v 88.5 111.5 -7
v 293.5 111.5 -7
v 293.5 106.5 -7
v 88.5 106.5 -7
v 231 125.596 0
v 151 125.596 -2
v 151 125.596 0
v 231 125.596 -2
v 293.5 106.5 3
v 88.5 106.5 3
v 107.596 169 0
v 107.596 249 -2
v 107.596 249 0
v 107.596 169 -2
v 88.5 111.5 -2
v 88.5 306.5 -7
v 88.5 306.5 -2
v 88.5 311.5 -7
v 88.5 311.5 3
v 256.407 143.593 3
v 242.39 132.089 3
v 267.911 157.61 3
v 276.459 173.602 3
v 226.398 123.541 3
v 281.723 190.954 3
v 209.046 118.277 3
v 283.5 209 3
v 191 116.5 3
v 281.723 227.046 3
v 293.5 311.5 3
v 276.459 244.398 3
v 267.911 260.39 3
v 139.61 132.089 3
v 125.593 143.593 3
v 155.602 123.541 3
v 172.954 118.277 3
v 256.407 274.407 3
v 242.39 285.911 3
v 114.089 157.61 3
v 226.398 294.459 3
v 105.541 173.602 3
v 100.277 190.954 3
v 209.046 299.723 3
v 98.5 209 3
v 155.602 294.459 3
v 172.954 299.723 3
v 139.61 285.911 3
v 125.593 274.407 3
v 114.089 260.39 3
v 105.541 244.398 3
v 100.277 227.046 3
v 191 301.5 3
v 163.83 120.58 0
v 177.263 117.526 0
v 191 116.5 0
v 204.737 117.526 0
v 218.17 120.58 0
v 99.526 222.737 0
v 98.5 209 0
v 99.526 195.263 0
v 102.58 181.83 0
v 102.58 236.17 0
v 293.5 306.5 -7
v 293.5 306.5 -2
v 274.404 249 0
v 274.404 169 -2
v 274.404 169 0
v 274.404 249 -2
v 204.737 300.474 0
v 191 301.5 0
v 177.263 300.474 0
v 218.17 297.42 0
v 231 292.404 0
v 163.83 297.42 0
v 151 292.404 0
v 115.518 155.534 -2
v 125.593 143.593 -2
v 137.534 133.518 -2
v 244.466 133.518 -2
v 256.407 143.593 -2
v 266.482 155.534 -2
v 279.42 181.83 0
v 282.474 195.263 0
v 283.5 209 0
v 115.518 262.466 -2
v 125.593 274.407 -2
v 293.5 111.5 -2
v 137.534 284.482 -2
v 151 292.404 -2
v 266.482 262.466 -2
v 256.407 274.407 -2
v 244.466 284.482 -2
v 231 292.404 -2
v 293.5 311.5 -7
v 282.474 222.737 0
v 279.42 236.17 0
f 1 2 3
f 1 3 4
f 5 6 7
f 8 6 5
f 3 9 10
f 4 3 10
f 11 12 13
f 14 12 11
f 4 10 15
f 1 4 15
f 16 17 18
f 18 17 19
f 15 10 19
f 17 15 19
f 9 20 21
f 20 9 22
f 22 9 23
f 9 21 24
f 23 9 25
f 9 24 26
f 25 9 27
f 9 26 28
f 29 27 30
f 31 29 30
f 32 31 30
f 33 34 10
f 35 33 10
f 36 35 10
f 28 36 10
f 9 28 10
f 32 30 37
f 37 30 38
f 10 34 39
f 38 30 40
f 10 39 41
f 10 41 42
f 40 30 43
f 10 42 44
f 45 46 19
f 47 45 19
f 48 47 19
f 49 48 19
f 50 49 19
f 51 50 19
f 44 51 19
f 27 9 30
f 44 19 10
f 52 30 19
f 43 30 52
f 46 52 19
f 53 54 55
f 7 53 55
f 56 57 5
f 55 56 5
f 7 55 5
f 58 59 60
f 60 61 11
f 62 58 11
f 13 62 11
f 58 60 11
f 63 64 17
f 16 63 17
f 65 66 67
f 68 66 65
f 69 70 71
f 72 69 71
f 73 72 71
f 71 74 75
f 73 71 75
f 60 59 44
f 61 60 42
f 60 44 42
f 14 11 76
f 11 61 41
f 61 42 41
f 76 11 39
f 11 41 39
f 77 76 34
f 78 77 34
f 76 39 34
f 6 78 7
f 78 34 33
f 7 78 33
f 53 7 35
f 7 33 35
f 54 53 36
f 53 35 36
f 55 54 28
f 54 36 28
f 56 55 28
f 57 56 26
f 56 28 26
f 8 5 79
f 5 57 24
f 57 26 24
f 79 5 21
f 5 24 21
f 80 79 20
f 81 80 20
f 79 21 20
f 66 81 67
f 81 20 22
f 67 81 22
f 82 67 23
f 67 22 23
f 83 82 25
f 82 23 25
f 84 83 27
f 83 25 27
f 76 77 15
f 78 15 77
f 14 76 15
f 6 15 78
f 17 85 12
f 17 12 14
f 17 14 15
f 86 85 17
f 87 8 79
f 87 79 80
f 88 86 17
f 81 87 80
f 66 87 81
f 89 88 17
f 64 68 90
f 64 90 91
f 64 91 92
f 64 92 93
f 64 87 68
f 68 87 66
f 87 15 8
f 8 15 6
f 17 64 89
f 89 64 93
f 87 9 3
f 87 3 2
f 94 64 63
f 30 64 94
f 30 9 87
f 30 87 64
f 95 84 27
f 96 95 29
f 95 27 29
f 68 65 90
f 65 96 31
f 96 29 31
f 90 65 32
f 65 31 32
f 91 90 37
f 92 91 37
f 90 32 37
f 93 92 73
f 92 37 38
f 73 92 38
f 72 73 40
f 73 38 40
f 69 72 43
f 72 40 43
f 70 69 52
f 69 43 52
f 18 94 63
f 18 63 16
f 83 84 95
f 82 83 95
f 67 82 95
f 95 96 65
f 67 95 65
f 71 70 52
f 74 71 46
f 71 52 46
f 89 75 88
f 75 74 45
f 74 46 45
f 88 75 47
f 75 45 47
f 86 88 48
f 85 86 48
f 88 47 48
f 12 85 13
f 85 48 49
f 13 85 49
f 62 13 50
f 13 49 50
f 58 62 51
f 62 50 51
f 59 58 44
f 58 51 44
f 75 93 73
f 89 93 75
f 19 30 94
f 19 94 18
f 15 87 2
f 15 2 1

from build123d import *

# Parameters (mm, degrees)
SKETCH_7_W               = 400
SKETCH_7_H               = 400
EXTRUDE_1_DEPTH          = 3
SKETCH_8_W               = 380
SKETCH_8_H               = 2
EXTRUDE_2_DEPTH          = 140
SKETCH_9_W               = 2
SKETCH_9_H               = 382
EXTRUDE_3_DEPTH          = 140
PATTERN_LINEAR_1_COUNT   = 12
PATTERN_LINEAR_1_PITCH   = 30
PATTERN_LINEAR_3_COUNT   = 12
PATTERN_LINEAR_3_PITCH   = 30
SKETCH_11_W              = 400
SKETCH_11_H              = 400
CUT_EXTRUDE_1_DEPTH      = 3
CUT_EXTRUDE_2_DEPTH      = 570.034269618
CUT_EXTRUDE_2_DEPTH_BACK = 570.034269618
SKETCH_12_R              = 300
SKETCH_12_R_2            = 90
SKETCH_13_R              = 92.5
SKETCH_13_R_2            = 89.5
EXTRUDE_8_DEPTH          = 140
SKETCH_14_W              = 205
SKETCH_14_H              = 205
SKETCH_14_W_2            = 185
SKETCH_14_H_2            = 185
EXTRUDE_9_DEPTH          = 5
EXTRUDE_10_DEPTH         = 2
PATTERN_CIRCULAR_1_COUNT = 4
CUT_EXTRUDE_START        = -140
SKETCH_16_R              = 92.5
CUT_EXTRUDE_3_DEPTH      = 140
SKETCH_17_W              = 205
SKETCH_17_H              = 5
EXTRUDE_11_DEPTH         = 5


with BuildPart() as part:
    # 草图7 → 凸台-拉伸1 (new body)
    with BuildSketch(Plane.XY):
        with Locations((200, 200)):
            Rectangle(SKETCH_7_W, SKETCH_7_H)
    extrude(amount=EXTRUDE_1_DEPTH)

    # 草图8 → 凸台-拉伸2 (add)
    with BuildSketch(Plane.XY.offset(3)):
        with Locations((200, 389)):
            Rectangle(SKETCH_8_W, SKETCH_8_H)
    extrude_2 = extrude(amount=EXTRUDE_2_DEPTH)

    # 草图9 → 凸台-拉伸3 (add)
    with BuildSketch(Plane.XY.offset(3)):
        with Locations((11, 199)):
            Rectangle(SKETCH_9_W, SKETCH_9_H)
    extrude_3 = extrude(amount=EXTRUDE_3_DEPTH)

    # 阵列(线性)1: 凸台-拉伸3 ×12
    with Locations(*[(i * PATTERN_LINEAR_1_PITCH, 0, 0) for i in range(1, PATTERN_LINEAR_1_COUNT)]):
        add(extrude_3)

    # 阵列(线性)3: 凸台-拉伸2 ×12
    with Locations(*[(0, -i * PATTERN_LINEAR_3_PITCH, 0) for i in range(1, PATTERN_LINEAR_3_COUNT)]):
        add(extrude_2)

    # 草图11 → 切除-拉伸1 (cut)
    with BuildSketch(Plane(origin=(0, 0, 0), x_dir=(-1, 0, 0), z_dir=(0, 0, -1))):
        with Locations((-200, 200)):
            Rectangle(SKETCH_11_W, SKETCH_11_H)
    extrude(amount=-CUT_EXTRUDE_1_DEPTH, mode=Mode.SUBTRACT)

    # 草图12 → 切除-拉伸2 (cut, two sides: drawn at the far end of the back side and taken through both)
    with BuildSketch(Plane(origin=(0, 0, 3), x_dir=(-1, 0, 0), z_dir=(0, 0, -1)).offset(-CUT_EXTRUDE_2_DEPTH_BACK)):
        with Locations((-191, 208.958405787)):
            Circle(SKETCH_12_R)
        with Locations((-191, 208.958405787)):
            Circle(SKETCH_12_R_2, mode=Mode.SUBTRACT)
    extrude(amount=CUT_EXTRUDE_2_DEPTH + CUT_EXTRUDE_2_DEPTH_BACK, mode=Mode.SUBTRACT)

    # 草图13 → 凸台-拉伸8 (add)
    with BuildSketch(Plane(origin=(0, 0, 3), x_dir=(-1, 0, 0), z_dir=(0, 0, -1))):
        with Locations((-191, 209)):
            Circle(SKETCH_13_R)
        with Locations((-191, 209)):
            Circle(SKETCH_13_R_2, mode=Mode.SUBTRACT)
    extrude(amount=-EXTRUDE_8_DEPTH)

    # 草图16 → 切除-拉伸3 (cut)
    with BuildSketch(Plane.XY.offset(143).offset(CUT_EXTRUDE_START)):
        with Locations(Location((191, 209, 0), (0, 0, 25.622027747))):
            Circle(SKETCH_16_R)
    extrude(amount=CUT_EXTRUDE_3_DEPTH, mode=Mode.SUBTRACT)


with BuildPart() as body_2:
    # 草图14 → 凸台-拉伸9 (new body)
    # profile 1 of 5: a face of its own
    with BuildSketch(Plane(origin=(0, 0, 3), x_dir=(-1, 0, 0), z_dir=(0, 0, -1))):
        with Locations((-191, 209)):
            Rectangle(SKETCH_14_W, SKETCH_14_H)
        with Locations((-191, 209)):
            Rectangle(SKETCH_14_W_2, SKETCH_14_H_2, mode=Mode.SUBTRACT)
    # profile 2 of 5: a face of its own
    with BuildSketch(Plane(origin=(0, 0, 3), x_dir=(-1, 0, 0), z_dir=(0, 0, -1))):
        with BuildLine():
            Line((-283.5, 209), (-283.5, 116.5))
            Line((-283.5, 116.5), (-191, 116.5))
            ThreePointArc((-191, 116.5), (-256.40737726, 143.59262274), (-283.5, 209))
        make_face()
    # profile 3 of 5: a face of its own
    with BuildSketch(Plane(origin=(0, 0, 3), x_dir=(-1, 0, 0), z_dir=(0, 0, -1))):
        with BuildLine():
            Line((-283.5, 301.5), (-283.5, 209))
            ThreePointArc((-283.5, 209), (-256.40737726, 274.40737726), (-191, 301.5))
            Line((-191, 301.5), (-283.5, 301.5))
        make_face()
    # profile 4 of 5: a face of its own
    with BuildSketch(Plane(origin=(0, 0, 3), x_dir=(-1, 0, 0), z_dir=(0, 0, -1))):
        with BuildLine():
            Line((-98.5, 301.5), (-191, 301.5))
            ThreePointArc((-191, 301.5), (-125.59262274, 274.40737726), (-98.5, 209))
            Line((-98.5, 209), (-98.5, 301.5))
        make_face()
    # profile 5 of 5: a face of its own
    with BuildSketch(Plane(origin=(0, 0, 3), x_dir=(-1, 0, 0), z_dir=(0, 0, -1))):
        with BuildLine():
            ThreePointArc((-98.5, 209), (-125.59262274, 143.59262274), (-191, 116.5))
            Line((-191, 116.5), (-98.5, 116.5))
            Line((-98.5, 116.5), (-98.5, 209))
        make_face()
    extrude(amount=EXTRUDE_9_DEPTH)

    # 草图15 → 凸台-拉伸10 (add)
    with BuildSketch(Plane(origin=(0, 0, -2), x_dir=(-1, 0, 0), z_dir=(0, 0, -1))):
        with BuildLine():
            Line((-231, 292.404136588), (-151, 292.404136588))
            ThreePointArc((-151, 292.404136588), (-191, 301.5), (-231, 292.404136588))
        make_face()
    extrude_10 = extrude(amount=-EXTRUDE_10_DEPTH)

    # 阵列(圆周)1: 凸台-拉伸10 ×4 about axis
    pattern_circular_1_axis = Axis((191, 209, 0), (0, 0, 1))
    for i in range(1, PATTERN_CIRCULAR_1_COUNT):
        add(extrude_10.rotate(pattern_circular_1_axis, i * 360 / PATTERN_CIRCULAR_1_COUNT))

    # 草图17 → 凸台-拉伸11 (add)
    with BuildSketch(Plane(origin=(0, 0, -2), x_dir=(-1, 0, 0), z_dir=(0, 0, -1))):
        with Locations((-191, 309)):
            Rectangle(SKETCH_17_W, SKETCH_17_H)
        with Locations((-191, 109)):
            Rectangle(SKETCH_17_W, SKETCH_17_H)
    extrude(amount=EXTRUDE_11_DEPTH)


solid = body_2.part
